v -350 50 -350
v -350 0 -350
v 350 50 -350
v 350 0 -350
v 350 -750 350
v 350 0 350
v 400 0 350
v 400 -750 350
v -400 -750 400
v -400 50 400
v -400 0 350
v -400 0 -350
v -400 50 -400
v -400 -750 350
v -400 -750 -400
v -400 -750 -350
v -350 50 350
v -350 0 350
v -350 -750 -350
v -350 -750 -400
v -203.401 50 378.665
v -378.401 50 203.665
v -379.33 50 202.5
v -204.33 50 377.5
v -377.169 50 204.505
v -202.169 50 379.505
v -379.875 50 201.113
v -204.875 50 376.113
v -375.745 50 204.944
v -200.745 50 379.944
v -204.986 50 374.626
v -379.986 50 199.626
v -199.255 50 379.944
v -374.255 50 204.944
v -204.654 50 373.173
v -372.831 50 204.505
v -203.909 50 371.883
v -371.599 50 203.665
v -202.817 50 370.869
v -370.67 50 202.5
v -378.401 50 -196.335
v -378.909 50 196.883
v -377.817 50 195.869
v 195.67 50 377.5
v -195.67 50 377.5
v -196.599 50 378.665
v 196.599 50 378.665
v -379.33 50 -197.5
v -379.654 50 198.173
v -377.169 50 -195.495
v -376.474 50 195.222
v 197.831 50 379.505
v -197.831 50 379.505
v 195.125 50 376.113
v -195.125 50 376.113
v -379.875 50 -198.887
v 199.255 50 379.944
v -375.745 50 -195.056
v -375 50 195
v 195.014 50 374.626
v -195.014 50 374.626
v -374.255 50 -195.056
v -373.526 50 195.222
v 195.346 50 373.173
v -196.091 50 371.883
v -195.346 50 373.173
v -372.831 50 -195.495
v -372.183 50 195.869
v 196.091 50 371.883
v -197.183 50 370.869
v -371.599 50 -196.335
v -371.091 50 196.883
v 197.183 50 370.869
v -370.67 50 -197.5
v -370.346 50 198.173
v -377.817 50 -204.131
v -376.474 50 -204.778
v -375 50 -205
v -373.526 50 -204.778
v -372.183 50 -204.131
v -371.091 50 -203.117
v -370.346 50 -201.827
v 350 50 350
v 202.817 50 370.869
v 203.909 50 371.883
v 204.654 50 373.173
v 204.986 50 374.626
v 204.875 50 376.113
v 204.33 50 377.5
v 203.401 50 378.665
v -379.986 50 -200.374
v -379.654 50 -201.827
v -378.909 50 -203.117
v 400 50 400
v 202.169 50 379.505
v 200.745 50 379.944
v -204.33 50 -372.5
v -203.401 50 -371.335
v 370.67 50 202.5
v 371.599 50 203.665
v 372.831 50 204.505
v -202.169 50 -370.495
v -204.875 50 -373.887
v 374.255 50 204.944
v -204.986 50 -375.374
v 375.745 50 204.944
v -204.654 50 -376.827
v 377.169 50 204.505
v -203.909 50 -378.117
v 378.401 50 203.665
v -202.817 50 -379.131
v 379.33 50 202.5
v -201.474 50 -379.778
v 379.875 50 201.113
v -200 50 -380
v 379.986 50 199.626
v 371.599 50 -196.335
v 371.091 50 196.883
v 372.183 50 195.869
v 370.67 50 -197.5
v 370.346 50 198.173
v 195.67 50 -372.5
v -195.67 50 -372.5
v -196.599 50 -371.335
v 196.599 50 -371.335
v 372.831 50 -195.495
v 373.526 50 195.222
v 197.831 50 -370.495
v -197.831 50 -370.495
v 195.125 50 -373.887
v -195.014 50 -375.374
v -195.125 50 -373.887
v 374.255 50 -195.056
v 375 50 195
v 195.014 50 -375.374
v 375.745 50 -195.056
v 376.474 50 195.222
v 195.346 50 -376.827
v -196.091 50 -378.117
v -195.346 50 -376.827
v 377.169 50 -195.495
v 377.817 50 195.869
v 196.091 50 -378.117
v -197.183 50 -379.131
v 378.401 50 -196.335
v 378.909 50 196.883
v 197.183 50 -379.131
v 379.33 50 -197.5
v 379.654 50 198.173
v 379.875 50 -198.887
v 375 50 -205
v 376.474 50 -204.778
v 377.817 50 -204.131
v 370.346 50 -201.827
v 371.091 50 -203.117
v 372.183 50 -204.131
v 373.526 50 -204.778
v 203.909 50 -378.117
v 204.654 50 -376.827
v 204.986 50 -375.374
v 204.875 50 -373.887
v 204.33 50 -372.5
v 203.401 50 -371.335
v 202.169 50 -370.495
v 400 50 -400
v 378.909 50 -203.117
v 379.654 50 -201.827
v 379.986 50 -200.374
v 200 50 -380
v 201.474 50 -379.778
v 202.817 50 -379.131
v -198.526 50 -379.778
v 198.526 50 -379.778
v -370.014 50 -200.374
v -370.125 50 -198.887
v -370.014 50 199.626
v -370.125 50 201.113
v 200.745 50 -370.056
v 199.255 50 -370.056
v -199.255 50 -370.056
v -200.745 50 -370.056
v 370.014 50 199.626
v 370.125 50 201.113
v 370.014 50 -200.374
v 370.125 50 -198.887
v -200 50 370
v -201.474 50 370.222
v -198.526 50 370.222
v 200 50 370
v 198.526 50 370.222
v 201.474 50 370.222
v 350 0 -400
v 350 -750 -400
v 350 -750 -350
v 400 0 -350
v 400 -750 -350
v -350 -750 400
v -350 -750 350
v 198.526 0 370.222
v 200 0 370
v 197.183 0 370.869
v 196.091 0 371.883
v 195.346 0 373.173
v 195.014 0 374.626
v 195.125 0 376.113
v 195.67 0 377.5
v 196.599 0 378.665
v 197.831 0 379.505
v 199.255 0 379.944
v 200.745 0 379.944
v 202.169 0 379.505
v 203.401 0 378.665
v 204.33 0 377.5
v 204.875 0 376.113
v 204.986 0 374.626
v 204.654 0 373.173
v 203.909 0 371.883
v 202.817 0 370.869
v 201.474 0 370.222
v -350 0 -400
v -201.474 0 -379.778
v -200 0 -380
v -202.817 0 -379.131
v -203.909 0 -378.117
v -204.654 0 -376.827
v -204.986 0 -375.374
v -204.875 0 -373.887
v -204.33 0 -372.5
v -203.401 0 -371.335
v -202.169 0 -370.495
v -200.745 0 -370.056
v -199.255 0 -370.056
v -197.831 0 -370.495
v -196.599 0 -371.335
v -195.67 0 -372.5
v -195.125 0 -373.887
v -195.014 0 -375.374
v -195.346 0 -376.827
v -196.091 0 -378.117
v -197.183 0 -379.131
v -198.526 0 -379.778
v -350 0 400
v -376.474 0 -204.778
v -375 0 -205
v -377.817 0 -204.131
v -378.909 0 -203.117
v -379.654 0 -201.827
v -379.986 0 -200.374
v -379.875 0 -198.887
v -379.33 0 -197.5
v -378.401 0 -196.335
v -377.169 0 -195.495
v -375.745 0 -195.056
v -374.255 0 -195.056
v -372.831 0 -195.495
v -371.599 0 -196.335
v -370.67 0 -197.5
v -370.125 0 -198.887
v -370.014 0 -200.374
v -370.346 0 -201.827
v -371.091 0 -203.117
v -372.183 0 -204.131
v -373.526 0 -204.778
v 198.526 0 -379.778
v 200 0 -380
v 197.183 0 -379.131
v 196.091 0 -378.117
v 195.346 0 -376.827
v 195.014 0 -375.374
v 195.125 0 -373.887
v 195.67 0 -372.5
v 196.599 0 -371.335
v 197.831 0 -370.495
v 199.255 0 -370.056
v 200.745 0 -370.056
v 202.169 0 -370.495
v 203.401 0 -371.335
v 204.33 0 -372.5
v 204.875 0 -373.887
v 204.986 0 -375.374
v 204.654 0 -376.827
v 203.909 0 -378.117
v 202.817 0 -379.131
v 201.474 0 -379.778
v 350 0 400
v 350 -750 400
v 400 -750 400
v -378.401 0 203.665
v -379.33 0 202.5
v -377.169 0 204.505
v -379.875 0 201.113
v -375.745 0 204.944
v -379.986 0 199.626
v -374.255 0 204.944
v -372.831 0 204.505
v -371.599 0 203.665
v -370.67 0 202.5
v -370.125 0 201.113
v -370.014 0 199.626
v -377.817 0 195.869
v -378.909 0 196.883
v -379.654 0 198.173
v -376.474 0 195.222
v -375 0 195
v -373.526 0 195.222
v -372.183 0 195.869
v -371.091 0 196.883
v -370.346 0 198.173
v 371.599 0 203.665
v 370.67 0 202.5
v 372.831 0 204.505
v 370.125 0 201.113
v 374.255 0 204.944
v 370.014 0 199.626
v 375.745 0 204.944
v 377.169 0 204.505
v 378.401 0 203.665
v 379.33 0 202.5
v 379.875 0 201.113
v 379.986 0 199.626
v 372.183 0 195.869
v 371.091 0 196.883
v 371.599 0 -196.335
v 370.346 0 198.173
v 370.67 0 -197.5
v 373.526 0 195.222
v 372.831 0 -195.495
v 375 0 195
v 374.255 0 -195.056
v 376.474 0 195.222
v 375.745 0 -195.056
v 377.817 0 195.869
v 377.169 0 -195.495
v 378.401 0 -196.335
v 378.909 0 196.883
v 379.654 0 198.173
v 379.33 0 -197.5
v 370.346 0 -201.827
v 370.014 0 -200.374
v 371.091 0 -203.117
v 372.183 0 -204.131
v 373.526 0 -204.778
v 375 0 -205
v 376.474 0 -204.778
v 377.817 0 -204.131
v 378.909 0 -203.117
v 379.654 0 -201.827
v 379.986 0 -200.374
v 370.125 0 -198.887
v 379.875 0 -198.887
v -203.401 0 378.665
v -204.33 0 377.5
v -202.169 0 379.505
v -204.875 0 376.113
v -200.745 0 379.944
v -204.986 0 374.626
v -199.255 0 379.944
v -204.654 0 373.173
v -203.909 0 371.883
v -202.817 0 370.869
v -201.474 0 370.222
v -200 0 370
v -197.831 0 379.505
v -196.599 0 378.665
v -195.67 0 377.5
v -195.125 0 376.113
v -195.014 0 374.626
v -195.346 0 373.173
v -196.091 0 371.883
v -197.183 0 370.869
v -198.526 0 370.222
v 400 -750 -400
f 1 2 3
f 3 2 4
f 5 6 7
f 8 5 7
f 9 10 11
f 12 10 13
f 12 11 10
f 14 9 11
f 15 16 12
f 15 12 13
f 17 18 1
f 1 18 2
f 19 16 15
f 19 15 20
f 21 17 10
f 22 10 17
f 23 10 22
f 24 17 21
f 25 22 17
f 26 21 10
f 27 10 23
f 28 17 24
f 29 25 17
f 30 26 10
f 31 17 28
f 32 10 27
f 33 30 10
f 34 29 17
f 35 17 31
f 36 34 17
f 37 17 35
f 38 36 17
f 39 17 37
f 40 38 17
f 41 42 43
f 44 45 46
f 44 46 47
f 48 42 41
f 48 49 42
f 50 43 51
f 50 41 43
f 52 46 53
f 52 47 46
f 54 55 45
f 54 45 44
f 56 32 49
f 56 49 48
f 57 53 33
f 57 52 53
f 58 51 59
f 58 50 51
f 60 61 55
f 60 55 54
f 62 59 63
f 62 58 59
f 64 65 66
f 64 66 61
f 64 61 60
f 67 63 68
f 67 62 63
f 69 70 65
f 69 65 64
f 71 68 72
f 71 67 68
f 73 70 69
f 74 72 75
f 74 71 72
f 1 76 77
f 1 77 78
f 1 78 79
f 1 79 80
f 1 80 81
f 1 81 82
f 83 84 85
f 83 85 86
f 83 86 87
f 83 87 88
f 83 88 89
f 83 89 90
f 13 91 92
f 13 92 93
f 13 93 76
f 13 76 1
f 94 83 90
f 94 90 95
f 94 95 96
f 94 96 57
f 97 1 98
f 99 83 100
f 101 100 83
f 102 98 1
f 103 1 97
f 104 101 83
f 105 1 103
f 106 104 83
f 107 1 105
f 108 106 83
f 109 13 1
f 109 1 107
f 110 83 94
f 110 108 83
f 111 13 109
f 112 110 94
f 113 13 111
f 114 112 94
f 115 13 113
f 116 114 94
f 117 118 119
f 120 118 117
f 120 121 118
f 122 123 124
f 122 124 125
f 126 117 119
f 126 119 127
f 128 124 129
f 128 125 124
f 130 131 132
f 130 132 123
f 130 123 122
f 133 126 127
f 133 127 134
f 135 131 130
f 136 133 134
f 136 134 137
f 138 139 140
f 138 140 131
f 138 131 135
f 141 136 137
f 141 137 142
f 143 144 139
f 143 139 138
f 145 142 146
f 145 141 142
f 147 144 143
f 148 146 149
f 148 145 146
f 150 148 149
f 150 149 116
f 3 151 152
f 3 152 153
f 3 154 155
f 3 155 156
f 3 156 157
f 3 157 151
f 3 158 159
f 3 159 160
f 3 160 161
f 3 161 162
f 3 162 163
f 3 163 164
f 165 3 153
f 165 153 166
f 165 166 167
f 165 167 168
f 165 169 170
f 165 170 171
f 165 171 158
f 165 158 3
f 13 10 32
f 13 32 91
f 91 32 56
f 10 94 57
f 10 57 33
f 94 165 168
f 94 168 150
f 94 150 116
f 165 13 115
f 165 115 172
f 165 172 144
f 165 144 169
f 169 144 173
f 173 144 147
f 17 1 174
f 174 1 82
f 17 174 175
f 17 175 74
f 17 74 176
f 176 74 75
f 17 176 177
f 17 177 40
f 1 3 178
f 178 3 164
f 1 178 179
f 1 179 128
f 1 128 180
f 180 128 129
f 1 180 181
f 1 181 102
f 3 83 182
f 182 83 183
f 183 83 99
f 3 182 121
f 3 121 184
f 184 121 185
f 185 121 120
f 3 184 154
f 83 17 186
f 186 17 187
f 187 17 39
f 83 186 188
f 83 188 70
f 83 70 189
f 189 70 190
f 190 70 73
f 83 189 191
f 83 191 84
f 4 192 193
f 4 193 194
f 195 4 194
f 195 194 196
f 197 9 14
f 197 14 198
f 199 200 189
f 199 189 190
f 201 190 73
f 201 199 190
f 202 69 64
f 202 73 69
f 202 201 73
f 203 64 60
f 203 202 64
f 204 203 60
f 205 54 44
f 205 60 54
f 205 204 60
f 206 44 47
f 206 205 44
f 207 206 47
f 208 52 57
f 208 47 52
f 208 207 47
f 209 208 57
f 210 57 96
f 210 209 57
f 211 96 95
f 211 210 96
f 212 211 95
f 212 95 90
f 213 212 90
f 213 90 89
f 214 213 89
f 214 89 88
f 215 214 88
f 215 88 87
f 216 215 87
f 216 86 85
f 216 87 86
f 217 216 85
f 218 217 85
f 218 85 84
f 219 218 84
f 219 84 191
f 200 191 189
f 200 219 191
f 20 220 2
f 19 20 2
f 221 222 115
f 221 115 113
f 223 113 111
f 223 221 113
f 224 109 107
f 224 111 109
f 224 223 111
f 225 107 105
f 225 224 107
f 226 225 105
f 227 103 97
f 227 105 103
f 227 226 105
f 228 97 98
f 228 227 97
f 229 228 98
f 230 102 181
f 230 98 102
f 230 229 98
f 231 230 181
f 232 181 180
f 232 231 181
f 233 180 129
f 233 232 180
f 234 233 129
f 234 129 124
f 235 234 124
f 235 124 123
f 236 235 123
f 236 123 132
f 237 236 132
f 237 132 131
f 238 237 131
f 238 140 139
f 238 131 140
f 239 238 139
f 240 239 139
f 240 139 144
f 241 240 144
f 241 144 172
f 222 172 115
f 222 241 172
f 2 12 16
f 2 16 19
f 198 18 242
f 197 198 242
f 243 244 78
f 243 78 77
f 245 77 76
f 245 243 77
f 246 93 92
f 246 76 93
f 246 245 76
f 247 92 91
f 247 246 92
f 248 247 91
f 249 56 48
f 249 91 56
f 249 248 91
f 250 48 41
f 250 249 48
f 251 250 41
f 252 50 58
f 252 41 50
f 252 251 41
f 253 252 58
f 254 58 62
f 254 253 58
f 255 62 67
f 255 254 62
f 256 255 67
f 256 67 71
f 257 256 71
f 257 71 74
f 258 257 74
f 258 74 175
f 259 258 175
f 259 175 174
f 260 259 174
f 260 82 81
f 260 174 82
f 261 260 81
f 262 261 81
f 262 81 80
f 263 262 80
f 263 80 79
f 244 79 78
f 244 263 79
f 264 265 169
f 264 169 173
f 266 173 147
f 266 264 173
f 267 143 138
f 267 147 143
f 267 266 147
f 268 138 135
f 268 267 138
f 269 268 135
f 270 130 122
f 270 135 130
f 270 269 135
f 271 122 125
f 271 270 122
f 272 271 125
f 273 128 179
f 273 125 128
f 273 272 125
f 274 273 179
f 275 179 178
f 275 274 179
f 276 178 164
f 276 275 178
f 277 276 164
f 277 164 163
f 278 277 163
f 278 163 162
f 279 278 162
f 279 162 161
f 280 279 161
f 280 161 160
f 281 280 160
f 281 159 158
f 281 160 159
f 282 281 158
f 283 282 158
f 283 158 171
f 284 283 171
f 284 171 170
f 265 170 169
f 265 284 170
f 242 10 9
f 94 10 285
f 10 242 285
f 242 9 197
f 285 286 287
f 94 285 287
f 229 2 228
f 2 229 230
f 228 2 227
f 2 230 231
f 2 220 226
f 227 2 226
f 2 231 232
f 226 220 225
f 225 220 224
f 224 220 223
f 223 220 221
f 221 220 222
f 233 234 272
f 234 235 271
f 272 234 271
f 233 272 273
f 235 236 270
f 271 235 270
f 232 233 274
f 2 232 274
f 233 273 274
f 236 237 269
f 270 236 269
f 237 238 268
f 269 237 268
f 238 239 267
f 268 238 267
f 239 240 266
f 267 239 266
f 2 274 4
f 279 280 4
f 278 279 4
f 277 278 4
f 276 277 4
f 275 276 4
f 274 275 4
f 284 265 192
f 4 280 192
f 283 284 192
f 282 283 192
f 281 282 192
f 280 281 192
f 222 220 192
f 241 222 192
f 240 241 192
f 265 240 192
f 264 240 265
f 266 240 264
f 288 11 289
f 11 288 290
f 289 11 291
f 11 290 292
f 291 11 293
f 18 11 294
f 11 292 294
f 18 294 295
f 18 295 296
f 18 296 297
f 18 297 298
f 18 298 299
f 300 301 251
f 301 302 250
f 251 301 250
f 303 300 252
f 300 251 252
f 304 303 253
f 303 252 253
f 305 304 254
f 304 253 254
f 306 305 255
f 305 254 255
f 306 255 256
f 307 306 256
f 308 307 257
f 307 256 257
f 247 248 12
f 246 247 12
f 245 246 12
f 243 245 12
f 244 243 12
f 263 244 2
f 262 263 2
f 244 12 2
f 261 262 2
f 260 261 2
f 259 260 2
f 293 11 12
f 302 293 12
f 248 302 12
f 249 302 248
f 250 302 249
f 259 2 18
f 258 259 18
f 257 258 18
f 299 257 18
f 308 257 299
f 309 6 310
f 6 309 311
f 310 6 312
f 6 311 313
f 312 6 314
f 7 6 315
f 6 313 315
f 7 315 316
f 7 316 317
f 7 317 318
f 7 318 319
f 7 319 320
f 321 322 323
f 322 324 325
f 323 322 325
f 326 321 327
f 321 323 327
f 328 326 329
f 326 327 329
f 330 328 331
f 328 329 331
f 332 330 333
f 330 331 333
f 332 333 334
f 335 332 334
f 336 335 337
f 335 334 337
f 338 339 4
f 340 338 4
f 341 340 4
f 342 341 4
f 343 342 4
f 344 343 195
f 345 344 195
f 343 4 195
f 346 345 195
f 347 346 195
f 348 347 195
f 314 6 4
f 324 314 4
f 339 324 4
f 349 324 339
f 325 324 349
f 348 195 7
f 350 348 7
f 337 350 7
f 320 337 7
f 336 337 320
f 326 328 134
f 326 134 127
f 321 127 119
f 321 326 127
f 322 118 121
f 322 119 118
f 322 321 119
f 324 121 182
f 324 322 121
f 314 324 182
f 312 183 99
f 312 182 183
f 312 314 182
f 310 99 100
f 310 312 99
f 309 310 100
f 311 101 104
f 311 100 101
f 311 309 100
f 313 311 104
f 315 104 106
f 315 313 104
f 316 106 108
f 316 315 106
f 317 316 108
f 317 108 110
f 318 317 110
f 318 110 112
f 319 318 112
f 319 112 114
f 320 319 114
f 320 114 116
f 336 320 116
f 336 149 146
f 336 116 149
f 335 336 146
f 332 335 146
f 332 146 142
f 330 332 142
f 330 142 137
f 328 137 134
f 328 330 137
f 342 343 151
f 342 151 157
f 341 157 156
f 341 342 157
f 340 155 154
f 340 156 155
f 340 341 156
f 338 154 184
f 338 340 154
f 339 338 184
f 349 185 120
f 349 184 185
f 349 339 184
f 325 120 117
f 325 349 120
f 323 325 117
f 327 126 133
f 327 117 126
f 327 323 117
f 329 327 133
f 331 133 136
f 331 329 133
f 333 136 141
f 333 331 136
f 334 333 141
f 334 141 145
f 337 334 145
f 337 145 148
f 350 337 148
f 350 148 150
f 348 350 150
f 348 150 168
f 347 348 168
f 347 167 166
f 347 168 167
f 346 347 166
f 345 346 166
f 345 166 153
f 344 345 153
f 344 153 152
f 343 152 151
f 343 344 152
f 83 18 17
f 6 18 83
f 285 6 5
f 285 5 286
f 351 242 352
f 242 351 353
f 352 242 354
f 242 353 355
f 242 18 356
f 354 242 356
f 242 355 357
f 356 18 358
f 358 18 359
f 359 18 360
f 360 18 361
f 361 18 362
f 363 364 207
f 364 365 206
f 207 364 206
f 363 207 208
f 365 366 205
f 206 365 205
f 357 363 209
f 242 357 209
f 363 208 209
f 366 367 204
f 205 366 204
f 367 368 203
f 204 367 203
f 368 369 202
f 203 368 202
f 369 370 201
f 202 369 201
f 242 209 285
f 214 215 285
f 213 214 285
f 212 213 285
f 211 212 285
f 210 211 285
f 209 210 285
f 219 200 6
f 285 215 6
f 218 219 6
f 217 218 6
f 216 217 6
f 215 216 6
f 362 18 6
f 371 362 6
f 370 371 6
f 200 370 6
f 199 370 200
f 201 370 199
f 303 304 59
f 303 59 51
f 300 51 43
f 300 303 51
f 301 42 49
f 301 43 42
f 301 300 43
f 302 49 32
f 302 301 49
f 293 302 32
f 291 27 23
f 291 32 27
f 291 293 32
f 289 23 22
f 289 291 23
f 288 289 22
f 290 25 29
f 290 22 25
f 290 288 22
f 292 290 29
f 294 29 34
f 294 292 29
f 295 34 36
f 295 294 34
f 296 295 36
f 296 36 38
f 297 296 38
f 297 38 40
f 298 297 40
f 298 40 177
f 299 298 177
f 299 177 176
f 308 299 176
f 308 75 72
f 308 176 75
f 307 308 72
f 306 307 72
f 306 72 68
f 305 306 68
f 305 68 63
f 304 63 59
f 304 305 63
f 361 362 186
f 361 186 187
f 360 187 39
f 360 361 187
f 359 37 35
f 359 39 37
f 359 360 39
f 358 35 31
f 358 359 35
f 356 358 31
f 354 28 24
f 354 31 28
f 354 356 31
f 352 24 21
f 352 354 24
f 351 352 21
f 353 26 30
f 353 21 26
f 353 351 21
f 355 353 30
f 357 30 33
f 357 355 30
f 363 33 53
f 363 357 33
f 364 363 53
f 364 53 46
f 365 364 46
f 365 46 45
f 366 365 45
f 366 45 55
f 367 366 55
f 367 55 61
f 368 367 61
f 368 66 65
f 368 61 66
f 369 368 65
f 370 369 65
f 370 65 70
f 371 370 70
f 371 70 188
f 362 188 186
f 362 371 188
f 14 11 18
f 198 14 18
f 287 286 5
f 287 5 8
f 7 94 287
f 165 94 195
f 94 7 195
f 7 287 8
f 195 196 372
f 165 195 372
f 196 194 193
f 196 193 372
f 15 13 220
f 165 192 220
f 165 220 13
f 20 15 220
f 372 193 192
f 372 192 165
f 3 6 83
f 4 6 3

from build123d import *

# Parameters (mm, degrees)
SKETCH1_W               = 800
SKETCH1_H               = 800
SKETCH1_W_2             = 700
SKETCH1_H_2             = 700
BOSS_EXTRUDE1_DEPTH     = 50
SKETCH2_W               = 50
SKETCH2_H               = 50
BOSS_EXTRUDE2_DEPTH     = 800
CUT_EXTRUDE1_DEPTH      = 980.795897113
CUT_EXTRUDE1_DEPTH_BACK = 980.795897113
SKETCH3_R               = 5


with BuildPart() as part:
    # Sketch1 → Boss-Extrude1 (new body)
    with BuildSketch(Plane(origin=(0, 0, 0), x_dir=(1, 0, 0), z_dir=(0, 1, 0))):
        Rectangle(SKETCH1_W, SKETCH1_H)
        Rectangle(SKETCH1_W_2, SKETCH1_H_2, mode=Mode.SUBTRACT)
    extrude(amount=BOSS_EXTRUDE1_DEPTH)

    # Sketch2 → Boss-Extrude2 (add)
    with BuildSketch(Plane.XZ.offset(-50)):
        with Locations((-375, 375)):
            Rectangle(SKETCH2_W, SKETCH2_H)
        with Locations((375, 375)):
            Rectangle(SKETCH2_W, SKETCH2_H)
        with Locations((375, -375)):
            Rectangle(SKETCH2_W, SKETCH2_H)
        with Locations((-375, -375)):
            Rectangle(SKETCH2_W, SKETCH2_H)
    extrude(amount=BOSS_EXTRUDE2_DEPTH)

    # Sketch3 → Cut-Extrude1 (cut, two sides: drawn at the far end of the back side and taken through both)
    with BuildSketch(Plane(origin=(0, 50, 0), x_dir=(1, 0, 0), z_dir=(0, 1, 0)).offset(-CUT_EXTRUDE1_DEPTH_BACK)):
        with Locations(Location((-200, 375, 0), (0, 0, 90))):
            Circle(SKETCH3_R)
        with Locations(Location((-375, 200, 0), (0, 0, 90))):
            Circle(SKETCH3_R)
        with Locations(Location((-375, -200, 0), (0, 0, 90))):
            Circle(SKETCH3_R)
        with Locations(Location((-200, -375, 0), (0, 0, 90))):
            Circle(SKETCH3_R)
        with Locations(Location((200, -375, 0), (0, 0, 90))):
            Circle(SKETCH3_R)
        with Locations(Location((375, -200, 0), (0, 0, 90))):
            Circle(SKETCH3_R)
        with Locations(Location((375, 200, 0), (0, 0, 90))):
            Circle(SKETCH3_R)
        with Locations(Location((200, 375, 0), (0, 0, 90))):
            Circle(SKETCH3_R)
    extrude(amount=CUT_EXTRUDE1_DEPTH + CUT_EXTRUDE1_DEPTH_BACK, mode=Mode.SUBTRACT)


solid = part.part
